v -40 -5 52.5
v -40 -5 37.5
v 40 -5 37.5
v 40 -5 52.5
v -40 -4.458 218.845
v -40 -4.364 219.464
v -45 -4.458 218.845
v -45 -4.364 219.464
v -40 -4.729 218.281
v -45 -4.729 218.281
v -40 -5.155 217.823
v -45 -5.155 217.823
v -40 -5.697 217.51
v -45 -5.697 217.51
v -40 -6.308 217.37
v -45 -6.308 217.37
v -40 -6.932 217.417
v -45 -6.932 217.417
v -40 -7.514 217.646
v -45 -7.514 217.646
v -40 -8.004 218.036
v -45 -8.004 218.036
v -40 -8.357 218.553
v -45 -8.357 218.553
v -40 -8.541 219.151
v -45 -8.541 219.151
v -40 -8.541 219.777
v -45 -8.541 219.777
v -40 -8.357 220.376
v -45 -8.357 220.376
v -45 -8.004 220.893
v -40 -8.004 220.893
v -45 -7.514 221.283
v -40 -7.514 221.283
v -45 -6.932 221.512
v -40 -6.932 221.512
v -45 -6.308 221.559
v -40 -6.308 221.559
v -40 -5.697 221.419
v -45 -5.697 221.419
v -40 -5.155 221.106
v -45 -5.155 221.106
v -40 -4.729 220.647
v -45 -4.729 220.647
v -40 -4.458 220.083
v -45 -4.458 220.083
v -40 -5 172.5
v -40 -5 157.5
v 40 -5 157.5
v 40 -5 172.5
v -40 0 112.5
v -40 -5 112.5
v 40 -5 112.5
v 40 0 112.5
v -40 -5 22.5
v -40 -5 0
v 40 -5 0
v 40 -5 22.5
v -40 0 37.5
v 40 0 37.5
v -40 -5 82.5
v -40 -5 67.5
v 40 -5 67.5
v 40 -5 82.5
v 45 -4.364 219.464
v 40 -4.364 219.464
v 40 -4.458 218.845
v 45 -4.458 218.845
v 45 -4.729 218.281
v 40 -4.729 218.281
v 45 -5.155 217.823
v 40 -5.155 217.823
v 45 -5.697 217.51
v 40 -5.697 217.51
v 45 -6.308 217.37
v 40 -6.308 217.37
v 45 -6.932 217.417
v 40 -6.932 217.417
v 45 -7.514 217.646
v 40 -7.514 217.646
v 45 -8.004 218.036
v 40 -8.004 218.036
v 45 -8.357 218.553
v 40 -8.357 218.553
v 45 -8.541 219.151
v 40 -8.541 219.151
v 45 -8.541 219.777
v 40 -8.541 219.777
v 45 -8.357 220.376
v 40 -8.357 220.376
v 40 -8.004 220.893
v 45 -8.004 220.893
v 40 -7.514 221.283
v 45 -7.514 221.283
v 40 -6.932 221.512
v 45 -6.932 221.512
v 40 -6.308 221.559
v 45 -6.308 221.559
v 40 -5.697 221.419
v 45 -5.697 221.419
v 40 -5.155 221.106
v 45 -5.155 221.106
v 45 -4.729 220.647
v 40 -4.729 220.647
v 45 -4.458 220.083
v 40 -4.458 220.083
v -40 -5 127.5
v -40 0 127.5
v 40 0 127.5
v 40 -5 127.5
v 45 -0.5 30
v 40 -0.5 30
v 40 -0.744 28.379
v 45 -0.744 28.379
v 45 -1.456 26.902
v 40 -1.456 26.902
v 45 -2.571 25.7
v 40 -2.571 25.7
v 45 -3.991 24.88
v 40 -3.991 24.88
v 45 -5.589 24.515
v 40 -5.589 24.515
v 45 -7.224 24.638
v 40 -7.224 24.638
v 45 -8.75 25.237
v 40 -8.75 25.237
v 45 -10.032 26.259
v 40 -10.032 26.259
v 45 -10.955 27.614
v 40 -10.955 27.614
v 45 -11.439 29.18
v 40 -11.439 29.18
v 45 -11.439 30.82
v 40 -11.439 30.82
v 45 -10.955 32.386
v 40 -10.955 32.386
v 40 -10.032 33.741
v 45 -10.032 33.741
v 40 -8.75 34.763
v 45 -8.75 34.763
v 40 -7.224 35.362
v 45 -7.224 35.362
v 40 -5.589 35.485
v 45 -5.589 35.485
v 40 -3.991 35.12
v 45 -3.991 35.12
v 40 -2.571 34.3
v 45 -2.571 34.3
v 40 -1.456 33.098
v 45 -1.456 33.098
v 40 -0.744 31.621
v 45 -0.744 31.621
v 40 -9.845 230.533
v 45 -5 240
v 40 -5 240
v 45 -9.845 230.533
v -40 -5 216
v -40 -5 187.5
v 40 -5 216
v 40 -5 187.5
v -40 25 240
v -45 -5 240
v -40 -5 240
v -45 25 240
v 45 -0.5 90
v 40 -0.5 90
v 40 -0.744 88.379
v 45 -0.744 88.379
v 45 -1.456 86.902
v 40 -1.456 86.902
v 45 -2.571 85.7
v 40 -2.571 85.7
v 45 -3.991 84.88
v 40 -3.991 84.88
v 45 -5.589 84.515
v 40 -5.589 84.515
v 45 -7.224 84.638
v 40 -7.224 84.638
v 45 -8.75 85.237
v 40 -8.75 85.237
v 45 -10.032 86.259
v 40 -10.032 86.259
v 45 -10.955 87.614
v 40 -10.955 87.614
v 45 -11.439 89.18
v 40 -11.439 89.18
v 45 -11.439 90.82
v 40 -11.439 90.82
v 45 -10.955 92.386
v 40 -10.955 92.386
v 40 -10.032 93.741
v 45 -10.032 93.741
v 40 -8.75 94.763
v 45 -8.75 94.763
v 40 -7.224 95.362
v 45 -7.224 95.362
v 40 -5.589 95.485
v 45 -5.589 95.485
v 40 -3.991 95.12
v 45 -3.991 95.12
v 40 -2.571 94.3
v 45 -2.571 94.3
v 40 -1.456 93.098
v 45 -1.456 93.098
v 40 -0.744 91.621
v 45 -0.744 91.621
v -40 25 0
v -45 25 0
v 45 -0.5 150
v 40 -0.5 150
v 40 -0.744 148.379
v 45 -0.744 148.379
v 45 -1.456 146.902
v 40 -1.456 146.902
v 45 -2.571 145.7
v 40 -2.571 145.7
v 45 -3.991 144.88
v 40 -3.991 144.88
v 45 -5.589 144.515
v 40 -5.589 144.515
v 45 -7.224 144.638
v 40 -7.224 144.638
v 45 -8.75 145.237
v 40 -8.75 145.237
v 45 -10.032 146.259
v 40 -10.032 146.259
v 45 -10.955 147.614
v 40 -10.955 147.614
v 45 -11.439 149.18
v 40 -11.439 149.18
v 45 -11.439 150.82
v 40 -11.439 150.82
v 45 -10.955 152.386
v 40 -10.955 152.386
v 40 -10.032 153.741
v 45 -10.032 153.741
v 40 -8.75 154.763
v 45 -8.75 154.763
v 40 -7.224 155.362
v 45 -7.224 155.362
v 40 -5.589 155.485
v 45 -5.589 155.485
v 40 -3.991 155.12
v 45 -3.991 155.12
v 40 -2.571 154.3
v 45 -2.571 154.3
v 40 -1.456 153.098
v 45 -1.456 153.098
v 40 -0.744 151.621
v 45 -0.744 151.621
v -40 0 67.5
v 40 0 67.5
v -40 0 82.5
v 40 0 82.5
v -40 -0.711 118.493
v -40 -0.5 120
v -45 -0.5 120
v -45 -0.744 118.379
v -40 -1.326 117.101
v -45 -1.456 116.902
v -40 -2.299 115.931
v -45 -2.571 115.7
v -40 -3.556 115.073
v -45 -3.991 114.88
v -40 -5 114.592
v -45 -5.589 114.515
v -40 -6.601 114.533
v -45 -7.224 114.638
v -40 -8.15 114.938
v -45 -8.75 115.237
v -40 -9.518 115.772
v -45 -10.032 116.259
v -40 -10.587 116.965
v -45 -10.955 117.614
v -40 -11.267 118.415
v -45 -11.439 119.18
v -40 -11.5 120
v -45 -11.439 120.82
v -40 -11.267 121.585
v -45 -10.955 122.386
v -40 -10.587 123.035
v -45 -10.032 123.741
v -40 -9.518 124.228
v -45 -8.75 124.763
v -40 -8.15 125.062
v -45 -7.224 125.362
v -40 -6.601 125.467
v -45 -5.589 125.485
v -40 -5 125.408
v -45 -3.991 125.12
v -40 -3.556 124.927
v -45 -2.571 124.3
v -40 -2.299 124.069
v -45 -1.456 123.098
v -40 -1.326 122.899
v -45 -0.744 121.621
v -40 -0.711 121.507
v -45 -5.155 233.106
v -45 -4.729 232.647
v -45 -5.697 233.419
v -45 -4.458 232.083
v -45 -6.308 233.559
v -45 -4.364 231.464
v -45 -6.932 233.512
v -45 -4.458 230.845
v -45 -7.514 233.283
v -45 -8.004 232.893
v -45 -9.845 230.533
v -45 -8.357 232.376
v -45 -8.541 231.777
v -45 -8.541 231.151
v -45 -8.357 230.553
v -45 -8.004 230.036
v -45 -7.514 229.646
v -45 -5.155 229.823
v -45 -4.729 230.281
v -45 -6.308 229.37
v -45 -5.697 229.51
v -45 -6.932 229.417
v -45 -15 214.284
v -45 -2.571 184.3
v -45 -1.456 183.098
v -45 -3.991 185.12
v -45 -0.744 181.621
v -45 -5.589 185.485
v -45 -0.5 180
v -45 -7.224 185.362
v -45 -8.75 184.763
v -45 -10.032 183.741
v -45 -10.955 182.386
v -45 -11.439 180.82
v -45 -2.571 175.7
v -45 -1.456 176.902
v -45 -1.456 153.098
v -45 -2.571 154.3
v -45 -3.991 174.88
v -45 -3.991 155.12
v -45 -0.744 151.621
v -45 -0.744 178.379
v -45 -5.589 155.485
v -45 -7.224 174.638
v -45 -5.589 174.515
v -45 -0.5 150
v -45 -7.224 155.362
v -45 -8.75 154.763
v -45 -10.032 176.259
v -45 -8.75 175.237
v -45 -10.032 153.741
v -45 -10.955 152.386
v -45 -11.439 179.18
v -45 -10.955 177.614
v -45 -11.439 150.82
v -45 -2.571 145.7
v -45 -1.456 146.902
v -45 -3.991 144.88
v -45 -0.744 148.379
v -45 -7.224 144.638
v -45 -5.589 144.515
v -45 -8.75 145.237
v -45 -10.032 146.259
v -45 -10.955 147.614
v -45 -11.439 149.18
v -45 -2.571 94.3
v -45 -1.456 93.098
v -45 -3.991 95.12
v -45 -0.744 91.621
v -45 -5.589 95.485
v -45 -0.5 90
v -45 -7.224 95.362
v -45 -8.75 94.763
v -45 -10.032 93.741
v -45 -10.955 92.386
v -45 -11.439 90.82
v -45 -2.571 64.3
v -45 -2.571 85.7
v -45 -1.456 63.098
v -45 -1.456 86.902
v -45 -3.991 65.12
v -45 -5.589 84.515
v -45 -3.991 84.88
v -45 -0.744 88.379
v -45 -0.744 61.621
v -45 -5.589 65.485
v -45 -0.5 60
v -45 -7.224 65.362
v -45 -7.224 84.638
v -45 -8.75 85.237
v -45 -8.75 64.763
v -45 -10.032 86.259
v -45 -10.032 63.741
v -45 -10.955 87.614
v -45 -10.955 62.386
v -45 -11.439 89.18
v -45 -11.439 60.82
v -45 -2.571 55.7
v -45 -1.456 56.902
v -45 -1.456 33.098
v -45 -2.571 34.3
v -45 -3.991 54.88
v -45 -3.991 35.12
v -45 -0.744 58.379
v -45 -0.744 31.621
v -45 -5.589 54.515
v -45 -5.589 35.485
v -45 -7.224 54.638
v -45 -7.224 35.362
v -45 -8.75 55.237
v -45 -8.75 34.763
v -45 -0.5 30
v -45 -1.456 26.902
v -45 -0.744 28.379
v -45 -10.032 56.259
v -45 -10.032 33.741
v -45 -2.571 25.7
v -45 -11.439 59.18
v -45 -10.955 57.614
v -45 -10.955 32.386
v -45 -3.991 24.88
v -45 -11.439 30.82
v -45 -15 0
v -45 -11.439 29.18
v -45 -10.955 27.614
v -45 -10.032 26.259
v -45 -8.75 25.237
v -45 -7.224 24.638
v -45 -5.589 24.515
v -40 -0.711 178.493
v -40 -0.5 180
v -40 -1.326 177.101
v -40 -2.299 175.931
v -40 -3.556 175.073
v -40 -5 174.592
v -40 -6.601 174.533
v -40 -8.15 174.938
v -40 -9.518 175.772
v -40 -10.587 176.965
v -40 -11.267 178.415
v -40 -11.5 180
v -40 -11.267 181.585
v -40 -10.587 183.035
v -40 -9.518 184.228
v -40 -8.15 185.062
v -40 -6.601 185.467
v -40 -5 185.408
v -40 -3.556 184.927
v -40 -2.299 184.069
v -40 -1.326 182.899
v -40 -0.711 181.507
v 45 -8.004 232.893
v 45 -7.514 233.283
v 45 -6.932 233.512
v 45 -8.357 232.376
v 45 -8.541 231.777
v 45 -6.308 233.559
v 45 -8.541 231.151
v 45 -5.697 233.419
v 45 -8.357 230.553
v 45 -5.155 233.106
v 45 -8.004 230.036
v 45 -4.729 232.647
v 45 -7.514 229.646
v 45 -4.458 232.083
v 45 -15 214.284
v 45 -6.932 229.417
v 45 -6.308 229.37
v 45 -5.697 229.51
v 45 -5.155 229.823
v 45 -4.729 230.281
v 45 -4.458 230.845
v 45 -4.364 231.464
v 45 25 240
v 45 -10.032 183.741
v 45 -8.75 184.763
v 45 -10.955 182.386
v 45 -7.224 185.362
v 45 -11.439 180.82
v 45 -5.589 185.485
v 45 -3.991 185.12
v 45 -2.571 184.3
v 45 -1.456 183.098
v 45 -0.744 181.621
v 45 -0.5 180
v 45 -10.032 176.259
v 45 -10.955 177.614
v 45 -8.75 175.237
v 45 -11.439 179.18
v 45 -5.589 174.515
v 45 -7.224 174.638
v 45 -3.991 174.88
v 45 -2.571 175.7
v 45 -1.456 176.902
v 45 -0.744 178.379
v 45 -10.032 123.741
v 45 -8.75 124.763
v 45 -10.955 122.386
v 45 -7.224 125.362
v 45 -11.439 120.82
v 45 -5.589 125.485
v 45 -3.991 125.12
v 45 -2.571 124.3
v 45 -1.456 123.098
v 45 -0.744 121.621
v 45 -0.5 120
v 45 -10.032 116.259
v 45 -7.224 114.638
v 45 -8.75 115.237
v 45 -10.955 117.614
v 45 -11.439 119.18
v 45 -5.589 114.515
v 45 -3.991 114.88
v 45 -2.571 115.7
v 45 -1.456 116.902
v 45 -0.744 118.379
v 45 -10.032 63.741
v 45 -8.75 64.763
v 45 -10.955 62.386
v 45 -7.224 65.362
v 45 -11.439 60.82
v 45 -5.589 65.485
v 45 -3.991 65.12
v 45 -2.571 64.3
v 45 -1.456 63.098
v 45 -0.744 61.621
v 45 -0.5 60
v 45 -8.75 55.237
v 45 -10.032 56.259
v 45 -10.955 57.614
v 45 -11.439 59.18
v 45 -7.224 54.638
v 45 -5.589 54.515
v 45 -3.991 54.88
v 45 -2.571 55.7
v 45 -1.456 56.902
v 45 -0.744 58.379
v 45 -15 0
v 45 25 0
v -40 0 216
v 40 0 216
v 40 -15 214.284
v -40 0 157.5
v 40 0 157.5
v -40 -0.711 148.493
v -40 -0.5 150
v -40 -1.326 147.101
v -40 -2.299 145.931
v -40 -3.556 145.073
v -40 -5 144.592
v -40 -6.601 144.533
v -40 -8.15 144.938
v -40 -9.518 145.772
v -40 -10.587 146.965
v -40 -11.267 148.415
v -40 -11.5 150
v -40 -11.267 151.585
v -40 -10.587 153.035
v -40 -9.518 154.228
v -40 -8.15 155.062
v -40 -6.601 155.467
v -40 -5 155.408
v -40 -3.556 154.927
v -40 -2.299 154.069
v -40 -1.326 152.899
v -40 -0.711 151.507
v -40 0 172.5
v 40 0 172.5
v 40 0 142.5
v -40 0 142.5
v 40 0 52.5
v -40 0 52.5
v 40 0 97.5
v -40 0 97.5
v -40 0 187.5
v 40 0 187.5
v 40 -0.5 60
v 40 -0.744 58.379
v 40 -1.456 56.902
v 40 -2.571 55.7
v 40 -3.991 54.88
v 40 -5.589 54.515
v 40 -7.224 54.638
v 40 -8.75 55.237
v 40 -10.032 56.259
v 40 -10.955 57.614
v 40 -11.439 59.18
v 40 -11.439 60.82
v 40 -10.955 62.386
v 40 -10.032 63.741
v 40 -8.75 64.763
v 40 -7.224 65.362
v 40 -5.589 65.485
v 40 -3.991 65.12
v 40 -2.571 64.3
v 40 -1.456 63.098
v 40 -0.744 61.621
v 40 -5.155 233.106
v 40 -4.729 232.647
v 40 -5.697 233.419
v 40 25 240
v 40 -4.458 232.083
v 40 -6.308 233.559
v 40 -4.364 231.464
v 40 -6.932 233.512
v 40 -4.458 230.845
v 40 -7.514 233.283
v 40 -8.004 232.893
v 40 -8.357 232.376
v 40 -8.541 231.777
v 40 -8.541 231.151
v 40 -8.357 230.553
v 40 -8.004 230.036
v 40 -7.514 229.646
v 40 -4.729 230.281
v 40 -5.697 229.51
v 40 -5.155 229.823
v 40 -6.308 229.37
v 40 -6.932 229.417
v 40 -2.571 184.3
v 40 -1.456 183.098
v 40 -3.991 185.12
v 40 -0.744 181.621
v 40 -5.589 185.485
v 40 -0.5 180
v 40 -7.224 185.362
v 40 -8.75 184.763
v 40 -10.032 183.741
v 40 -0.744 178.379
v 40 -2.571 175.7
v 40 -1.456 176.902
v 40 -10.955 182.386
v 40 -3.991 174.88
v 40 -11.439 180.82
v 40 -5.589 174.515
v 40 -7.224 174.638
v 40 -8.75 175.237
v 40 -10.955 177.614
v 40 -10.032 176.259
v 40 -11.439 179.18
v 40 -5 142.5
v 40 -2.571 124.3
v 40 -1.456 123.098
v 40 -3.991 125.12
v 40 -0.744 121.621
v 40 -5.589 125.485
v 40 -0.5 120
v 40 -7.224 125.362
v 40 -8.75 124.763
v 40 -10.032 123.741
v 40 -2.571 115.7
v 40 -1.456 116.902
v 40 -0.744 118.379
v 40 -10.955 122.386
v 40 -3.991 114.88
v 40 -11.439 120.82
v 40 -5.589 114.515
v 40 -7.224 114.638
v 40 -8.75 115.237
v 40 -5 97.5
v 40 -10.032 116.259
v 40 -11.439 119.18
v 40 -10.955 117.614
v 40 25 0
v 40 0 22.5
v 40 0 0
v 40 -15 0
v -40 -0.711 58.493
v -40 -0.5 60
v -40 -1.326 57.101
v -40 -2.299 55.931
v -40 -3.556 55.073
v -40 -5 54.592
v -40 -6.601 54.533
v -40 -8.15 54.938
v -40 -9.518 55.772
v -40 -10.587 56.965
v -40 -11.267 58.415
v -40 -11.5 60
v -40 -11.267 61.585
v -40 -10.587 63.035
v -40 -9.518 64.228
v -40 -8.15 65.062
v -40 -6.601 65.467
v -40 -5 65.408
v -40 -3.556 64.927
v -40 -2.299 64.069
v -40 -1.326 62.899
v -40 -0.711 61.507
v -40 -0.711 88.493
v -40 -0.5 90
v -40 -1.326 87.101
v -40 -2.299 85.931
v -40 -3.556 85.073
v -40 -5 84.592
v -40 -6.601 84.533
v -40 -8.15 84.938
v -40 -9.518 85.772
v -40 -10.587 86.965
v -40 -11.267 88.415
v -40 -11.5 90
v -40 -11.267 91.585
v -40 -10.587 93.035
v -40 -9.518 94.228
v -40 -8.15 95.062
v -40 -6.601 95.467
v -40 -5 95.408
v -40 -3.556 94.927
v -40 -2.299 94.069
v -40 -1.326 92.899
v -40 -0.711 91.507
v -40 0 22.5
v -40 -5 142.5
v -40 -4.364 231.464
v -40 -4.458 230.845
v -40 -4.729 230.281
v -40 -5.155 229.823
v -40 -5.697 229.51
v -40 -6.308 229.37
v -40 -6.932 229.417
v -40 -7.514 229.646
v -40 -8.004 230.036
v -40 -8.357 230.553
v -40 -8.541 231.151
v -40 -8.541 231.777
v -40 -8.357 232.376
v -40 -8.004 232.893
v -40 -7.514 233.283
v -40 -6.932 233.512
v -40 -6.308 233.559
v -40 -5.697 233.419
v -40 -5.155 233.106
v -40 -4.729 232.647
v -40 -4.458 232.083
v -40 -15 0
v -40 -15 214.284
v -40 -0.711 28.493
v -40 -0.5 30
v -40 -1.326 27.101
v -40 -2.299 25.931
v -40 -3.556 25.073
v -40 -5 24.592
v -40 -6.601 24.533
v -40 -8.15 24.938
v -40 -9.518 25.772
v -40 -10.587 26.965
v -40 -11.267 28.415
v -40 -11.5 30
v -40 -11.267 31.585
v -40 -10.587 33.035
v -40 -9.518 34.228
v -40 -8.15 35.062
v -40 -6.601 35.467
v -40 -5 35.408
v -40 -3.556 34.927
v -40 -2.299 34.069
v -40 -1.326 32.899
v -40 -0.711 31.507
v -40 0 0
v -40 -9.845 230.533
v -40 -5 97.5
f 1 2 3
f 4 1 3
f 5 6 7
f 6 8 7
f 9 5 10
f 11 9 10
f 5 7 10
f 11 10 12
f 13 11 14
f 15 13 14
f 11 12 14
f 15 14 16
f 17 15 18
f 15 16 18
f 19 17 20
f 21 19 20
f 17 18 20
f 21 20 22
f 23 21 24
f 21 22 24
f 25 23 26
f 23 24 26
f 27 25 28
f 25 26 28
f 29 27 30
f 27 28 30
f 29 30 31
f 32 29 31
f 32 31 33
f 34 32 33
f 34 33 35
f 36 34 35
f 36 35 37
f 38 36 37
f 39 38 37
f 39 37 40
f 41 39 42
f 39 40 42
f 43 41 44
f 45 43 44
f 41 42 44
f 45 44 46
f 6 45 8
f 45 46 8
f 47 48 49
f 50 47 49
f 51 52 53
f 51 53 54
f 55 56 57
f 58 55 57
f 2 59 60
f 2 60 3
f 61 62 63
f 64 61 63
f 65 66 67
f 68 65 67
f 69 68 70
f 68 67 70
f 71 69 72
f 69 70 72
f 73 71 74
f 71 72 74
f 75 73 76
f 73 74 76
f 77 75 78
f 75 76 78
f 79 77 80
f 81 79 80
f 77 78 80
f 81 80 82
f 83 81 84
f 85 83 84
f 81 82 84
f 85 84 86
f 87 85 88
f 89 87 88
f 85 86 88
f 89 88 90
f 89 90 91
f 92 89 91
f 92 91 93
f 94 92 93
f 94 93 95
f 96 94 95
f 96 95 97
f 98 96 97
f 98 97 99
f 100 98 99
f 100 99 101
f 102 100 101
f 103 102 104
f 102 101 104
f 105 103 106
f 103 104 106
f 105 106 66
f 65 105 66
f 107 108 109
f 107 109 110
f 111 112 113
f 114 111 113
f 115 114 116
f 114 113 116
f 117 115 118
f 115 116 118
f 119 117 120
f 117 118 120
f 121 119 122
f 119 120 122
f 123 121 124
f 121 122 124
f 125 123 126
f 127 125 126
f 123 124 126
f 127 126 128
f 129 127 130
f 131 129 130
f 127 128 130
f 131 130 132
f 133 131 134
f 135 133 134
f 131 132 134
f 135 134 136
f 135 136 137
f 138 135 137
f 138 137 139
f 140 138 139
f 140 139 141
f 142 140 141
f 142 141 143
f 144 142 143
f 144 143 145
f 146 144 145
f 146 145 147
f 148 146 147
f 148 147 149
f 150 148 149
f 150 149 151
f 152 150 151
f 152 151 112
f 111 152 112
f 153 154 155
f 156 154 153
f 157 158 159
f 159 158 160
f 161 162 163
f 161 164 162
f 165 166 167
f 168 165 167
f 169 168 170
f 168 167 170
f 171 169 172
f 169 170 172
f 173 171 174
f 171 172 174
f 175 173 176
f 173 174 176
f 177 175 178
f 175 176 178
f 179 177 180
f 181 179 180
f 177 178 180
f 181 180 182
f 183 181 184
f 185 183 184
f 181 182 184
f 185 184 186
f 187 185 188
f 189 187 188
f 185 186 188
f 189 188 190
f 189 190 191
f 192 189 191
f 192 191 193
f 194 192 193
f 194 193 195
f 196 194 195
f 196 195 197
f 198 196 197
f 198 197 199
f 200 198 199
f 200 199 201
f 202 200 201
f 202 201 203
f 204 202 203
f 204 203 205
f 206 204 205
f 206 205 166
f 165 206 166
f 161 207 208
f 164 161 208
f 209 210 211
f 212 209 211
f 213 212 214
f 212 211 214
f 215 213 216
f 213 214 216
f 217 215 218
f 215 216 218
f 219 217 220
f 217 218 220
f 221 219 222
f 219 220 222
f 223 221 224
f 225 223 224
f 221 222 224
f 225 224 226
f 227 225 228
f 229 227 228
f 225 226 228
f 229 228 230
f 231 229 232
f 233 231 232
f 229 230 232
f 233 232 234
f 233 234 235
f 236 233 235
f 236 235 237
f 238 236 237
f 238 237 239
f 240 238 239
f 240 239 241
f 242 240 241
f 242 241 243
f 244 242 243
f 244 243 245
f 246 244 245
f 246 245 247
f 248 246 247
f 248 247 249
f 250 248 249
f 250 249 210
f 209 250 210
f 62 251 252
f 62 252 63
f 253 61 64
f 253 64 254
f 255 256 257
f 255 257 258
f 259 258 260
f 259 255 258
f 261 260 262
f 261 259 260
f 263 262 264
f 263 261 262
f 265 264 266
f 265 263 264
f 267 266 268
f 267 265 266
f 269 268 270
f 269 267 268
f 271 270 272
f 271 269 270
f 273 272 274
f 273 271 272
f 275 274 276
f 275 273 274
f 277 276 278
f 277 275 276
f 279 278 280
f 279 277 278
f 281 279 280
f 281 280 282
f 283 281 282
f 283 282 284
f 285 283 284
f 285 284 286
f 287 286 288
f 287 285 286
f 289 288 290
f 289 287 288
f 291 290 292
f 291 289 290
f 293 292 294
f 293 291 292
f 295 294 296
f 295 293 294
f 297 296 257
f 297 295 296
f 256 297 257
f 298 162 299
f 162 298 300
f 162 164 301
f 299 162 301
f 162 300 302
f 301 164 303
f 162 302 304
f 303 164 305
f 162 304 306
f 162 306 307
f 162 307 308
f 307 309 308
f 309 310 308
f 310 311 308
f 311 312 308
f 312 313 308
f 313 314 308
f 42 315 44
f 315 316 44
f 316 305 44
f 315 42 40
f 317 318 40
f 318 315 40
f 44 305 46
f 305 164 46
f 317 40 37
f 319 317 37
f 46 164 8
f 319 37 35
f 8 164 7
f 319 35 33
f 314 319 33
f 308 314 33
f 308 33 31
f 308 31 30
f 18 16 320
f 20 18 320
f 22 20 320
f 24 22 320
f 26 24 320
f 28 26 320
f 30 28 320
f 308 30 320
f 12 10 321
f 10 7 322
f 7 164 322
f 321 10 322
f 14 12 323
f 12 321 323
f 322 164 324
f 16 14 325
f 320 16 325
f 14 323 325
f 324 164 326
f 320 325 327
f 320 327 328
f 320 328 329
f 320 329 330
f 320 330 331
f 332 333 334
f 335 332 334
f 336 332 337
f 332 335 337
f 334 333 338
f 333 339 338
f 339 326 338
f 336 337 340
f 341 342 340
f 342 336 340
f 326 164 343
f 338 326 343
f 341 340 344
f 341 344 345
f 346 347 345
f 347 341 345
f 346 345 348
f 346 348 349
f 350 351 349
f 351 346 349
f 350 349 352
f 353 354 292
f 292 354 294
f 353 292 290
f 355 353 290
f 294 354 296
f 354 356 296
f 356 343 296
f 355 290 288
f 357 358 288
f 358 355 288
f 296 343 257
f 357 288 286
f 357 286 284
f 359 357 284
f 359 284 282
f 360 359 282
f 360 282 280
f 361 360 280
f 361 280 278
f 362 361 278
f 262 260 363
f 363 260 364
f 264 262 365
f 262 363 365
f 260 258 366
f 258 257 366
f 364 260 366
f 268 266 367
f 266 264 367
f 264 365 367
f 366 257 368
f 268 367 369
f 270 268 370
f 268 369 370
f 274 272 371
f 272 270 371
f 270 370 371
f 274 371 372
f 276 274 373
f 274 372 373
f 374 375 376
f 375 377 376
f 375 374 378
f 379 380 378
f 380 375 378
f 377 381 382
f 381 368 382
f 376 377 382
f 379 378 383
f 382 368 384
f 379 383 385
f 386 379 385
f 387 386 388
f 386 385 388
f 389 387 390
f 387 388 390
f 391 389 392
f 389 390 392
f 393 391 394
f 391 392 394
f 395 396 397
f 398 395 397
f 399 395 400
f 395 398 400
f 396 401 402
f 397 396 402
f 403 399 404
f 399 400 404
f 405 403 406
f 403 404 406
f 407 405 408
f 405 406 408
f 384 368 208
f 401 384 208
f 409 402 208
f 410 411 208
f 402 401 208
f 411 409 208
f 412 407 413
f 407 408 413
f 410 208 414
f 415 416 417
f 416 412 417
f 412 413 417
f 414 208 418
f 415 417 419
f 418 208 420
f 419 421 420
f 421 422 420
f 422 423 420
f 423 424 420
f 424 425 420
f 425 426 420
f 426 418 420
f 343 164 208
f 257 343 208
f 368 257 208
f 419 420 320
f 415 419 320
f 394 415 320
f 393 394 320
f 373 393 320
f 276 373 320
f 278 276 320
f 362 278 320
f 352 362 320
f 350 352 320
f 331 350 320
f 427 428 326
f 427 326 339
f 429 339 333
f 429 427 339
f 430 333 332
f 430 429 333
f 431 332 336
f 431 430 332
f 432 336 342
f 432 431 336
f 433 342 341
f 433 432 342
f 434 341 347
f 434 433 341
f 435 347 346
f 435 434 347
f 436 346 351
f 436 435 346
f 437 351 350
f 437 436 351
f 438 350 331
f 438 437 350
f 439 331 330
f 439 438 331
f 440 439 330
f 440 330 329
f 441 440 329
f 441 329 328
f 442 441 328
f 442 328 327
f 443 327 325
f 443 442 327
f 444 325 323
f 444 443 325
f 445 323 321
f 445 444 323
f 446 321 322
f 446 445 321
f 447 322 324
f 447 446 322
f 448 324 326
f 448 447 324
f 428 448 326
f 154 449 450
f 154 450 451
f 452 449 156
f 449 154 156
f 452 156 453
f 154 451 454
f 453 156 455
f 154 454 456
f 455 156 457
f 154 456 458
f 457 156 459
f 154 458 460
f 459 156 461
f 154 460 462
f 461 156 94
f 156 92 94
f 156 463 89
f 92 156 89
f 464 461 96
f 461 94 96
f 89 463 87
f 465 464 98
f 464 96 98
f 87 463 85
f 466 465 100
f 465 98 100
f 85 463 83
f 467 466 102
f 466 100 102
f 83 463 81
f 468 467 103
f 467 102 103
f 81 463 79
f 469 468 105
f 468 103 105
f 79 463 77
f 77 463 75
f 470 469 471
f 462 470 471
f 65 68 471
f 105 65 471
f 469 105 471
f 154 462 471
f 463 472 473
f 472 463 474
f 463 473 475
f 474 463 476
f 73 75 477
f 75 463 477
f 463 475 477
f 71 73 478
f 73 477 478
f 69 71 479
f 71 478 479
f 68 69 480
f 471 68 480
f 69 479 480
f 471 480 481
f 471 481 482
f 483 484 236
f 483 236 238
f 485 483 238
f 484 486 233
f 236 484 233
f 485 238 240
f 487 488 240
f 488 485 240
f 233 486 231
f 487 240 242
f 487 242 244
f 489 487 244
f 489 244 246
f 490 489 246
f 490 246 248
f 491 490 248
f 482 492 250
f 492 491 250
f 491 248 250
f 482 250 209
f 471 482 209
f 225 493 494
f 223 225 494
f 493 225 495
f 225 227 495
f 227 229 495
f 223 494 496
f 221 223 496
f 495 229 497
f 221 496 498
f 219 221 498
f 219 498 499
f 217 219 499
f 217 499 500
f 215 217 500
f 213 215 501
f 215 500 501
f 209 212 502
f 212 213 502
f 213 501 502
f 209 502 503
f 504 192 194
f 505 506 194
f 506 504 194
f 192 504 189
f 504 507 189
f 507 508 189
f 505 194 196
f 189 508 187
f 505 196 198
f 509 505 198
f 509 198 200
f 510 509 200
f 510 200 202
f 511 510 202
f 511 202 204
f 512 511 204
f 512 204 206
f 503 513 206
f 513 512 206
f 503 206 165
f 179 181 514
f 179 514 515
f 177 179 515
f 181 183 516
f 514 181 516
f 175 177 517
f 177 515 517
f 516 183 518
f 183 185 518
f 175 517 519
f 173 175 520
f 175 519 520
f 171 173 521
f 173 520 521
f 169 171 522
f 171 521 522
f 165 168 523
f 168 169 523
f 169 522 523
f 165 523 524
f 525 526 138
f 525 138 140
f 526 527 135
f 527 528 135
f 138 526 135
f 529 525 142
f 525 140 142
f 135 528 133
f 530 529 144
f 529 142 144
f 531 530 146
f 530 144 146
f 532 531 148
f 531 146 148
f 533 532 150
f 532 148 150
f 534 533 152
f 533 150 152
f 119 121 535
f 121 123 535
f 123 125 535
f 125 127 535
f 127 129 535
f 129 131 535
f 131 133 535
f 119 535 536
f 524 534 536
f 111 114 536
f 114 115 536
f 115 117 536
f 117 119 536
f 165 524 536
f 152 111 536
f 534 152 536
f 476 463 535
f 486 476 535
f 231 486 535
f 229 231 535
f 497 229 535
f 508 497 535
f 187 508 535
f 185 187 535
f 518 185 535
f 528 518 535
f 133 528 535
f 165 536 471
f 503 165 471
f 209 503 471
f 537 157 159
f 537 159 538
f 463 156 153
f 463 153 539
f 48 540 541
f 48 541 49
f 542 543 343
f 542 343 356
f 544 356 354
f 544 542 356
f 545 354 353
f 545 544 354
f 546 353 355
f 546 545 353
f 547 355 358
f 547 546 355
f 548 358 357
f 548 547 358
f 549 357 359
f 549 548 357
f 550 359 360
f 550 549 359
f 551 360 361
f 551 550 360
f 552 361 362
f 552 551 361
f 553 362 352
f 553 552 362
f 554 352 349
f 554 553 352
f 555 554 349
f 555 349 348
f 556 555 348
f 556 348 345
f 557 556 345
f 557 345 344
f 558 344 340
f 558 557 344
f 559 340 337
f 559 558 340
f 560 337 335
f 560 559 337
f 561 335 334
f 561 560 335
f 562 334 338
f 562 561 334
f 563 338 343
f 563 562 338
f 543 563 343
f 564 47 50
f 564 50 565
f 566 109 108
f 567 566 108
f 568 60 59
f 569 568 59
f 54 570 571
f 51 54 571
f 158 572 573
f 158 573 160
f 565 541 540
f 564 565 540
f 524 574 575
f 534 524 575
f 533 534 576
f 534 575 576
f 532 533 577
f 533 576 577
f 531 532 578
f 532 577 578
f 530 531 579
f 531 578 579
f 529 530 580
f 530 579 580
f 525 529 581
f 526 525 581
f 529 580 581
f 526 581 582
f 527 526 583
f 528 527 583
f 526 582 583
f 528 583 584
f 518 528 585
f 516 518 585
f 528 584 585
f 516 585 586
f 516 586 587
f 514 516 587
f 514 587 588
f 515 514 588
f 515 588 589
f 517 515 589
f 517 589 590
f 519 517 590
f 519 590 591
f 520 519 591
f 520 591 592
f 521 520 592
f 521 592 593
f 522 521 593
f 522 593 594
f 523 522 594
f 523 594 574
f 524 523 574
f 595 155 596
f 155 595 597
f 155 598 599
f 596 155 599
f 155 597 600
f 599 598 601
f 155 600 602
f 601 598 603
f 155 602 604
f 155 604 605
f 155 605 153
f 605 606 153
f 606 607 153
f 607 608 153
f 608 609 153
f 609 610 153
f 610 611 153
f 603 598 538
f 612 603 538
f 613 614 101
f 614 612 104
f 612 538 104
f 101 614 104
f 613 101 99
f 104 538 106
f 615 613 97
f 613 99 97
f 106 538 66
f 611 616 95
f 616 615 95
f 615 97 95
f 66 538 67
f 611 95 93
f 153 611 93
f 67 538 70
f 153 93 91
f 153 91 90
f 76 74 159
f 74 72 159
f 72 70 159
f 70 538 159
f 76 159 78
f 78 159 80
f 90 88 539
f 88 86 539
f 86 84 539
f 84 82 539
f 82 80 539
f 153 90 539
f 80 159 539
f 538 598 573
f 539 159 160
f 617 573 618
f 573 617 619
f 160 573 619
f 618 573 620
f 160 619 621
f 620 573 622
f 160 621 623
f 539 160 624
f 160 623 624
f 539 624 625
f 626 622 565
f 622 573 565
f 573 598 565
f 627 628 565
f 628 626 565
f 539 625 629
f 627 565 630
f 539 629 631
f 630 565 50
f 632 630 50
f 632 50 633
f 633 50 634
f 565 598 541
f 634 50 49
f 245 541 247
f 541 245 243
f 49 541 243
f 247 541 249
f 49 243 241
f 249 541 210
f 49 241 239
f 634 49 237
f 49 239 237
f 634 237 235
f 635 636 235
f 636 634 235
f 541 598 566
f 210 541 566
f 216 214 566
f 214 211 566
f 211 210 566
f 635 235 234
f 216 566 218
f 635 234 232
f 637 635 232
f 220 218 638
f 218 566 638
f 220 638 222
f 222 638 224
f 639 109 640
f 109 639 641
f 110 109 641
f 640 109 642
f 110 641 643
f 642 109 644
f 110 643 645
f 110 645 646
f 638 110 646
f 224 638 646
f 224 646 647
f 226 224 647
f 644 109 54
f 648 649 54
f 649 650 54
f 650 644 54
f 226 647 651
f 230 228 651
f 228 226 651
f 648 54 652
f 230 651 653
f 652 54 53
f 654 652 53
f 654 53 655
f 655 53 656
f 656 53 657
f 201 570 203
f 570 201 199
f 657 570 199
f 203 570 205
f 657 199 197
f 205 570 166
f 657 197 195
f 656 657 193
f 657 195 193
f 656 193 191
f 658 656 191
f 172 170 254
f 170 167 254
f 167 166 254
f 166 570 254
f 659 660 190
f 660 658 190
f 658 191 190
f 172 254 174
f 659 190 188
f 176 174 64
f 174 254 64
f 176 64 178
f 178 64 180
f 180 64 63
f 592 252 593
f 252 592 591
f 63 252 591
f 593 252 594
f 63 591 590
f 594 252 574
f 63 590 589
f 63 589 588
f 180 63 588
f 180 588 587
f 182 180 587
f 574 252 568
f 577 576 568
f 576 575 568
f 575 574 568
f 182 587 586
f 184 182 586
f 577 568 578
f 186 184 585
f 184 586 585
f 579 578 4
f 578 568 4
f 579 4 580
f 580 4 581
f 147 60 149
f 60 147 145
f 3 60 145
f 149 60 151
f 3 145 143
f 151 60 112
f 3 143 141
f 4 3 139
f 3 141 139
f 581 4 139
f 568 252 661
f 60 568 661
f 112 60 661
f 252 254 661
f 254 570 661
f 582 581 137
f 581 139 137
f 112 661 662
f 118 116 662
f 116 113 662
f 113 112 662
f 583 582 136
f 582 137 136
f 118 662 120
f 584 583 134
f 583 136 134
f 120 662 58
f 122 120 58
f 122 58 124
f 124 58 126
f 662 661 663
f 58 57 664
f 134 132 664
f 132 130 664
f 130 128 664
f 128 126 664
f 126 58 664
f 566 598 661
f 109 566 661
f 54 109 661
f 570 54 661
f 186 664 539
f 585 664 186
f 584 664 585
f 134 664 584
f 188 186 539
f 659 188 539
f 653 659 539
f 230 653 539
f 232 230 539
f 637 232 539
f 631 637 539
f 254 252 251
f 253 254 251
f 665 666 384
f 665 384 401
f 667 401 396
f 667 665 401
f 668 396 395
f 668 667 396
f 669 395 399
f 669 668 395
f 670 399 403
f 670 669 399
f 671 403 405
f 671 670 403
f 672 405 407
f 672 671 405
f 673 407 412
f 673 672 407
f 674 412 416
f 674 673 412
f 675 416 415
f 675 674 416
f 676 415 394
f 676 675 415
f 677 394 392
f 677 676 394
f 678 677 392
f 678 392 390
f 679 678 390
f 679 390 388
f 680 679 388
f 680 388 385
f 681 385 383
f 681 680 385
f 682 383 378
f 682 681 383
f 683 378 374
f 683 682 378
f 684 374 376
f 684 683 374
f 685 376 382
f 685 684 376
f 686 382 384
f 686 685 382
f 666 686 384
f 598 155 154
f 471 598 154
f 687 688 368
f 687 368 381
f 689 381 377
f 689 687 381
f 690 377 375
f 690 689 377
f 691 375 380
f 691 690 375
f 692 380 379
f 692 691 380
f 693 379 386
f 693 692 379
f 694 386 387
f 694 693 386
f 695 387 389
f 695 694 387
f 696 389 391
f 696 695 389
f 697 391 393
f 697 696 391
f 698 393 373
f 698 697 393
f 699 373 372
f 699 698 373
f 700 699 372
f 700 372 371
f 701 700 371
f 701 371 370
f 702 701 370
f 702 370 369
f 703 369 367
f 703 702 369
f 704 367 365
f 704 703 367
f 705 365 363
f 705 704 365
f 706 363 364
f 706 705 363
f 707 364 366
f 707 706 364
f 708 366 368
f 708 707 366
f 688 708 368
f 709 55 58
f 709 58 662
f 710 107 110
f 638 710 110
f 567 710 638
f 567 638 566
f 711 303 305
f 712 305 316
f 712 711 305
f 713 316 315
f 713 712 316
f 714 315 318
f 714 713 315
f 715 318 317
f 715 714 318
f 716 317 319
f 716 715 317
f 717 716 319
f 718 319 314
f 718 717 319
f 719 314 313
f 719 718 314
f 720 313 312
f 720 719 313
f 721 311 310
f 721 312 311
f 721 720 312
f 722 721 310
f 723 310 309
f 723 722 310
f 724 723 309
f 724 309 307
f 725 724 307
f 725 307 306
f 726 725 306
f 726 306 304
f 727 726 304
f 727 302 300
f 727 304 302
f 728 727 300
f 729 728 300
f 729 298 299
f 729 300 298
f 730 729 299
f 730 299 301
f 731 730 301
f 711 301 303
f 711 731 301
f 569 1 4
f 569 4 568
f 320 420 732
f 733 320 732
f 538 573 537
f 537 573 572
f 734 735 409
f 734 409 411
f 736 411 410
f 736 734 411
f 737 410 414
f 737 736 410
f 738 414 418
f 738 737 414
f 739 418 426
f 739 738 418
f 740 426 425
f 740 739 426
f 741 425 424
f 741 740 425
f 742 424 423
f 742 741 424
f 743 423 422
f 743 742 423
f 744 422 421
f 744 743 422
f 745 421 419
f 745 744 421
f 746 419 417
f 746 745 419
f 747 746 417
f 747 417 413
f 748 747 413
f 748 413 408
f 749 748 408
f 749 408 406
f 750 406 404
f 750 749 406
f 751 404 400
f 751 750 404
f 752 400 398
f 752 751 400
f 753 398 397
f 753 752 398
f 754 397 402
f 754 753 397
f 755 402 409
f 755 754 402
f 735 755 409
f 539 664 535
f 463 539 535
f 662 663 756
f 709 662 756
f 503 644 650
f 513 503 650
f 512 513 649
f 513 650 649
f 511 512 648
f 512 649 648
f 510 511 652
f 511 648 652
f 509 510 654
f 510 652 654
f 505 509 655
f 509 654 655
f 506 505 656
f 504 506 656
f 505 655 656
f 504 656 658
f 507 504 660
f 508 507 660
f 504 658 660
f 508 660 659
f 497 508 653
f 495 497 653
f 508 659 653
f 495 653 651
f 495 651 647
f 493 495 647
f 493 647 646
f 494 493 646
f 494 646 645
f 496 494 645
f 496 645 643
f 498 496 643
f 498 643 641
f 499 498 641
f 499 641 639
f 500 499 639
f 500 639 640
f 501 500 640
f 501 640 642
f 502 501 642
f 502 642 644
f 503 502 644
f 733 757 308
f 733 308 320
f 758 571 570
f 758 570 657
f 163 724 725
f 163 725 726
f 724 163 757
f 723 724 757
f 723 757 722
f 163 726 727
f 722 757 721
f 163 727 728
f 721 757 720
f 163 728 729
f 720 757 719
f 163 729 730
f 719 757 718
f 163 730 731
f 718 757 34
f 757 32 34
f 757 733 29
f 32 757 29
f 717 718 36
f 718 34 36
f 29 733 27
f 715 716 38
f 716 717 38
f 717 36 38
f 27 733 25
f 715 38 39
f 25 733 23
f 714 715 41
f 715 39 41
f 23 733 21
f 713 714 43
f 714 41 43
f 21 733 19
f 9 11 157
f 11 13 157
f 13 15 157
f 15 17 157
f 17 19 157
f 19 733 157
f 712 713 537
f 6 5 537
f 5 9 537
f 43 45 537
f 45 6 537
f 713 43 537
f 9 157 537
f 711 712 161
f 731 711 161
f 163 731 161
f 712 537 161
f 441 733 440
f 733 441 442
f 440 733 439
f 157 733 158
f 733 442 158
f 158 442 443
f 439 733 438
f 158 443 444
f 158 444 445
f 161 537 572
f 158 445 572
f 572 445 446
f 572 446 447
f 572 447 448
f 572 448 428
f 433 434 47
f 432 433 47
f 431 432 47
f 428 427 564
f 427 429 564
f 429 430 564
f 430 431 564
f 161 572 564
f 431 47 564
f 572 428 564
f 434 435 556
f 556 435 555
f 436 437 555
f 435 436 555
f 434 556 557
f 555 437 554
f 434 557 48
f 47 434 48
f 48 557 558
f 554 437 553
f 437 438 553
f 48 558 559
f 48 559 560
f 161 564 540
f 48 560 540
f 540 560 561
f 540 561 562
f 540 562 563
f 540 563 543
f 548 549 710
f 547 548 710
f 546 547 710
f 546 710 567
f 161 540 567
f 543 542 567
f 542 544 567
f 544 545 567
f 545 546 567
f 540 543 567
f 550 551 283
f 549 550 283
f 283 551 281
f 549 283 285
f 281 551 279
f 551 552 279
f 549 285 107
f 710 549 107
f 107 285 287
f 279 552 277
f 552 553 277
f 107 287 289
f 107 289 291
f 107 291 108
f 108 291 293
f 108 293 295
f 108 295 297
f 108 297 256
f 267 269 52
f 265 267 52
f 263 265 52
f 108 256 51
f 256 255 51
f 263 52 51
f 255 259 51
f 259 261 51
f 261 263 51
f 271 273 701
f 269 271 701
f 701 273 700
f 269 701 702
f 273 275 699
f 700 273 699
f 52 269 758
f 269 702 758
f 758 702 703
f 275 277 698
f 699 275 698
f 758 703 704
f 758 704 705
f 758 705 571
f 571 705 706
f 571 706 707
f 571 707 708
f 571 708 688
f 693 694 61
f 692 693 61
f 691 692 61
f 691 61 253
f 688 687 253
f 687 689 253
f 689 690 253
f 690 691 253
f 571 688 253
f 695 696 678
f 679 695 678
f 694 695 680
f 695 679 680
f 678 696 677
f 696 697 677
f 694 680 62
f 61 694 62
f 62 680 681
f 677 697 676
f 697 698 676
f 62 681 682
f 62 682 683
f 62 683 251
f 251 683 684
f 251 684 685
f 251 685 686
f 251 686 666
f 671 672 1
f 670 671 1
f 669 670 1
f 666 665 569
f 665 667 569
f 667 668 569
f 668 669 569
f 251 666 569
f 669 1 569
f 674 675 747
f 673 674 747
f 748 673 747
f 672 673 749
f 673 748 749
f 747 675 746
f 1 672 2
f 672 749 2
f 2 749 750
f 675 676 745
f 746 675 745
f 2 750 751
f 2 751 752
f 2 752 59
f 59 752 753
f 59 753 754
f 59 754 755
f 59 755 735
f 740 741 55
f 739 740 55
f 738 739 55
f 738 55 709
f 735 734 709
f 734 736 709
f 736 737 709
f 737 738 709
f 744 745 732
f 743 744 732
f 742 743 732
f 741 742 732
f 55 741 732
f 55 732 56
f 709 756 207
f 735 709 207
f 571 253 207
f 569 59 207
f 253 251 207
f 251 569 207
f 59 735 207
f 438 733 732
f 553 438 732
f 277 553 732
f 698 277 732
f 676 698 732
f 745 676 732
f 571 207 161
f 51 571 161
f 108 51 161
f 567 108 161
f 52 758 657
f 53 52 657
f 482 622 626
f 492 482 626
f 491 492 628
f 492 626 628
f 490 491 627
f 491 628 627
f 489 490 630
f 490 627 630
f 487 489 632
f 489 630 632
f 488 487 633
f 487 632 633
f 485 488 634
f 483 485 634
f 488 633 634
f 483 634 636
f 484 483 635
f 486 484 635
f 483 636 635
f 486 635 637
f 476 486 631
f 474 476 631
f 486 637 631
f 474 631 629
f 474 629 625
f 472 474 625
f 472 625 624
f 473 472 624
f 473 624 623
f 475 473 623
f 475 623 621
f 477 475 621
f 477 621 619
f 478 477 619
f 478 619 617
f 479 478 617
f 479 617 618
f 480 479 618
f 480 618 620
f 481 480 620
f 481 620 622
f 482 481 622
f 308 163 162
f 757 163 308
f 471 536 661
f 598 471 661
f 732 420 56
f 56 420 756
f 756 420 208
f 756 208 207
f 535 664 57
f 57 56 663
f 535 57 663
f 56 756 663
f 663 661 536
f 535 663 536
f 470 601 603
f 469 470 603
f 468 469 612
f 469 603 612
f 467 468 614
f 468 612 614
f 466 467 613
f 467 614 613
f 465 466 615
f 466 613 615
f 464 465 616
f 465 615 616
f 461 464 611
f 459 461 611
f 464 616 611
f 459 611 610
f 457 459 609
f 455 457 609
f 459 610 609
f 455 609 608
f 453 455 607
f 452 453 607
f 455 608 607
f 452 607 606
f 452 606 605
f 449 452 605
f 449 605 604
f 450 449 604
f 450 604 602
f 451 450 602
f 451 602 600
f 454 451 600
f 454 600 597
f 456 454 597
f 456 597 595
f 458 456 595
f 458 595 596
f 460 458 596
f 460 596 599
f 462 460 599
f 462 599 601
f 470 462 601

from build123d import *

# Parameters (mm, degrees)
SKETCH_1_W          = 5
SKETCH_1_H          = 10
EXTRUDE_1_DEPTH     = 240
SKETCH_3_R          = 2.1
SKETCH_3_R_2        = 5.5
CUT_EXTRUDE_1_DEPTH = 90
CUT_EXTRUDE_2_DEPTH = 80
SKETCH_8_W          = 24
SKETCH_8_H          = 5
CUT_EXTRUDE_3_DEPTH = 80


# Read off the part's stored shape, not the designer's step: 切除-拉伸2
with BuildPart() as part:
    # 草图1 → 凸台-拉伸1 (new body)
    with BuildSketch(Plane.XY):
        Polygon((0, -5), (0, 0), (-40, 0), (-40, 25), (-45, 25), (-45, -5), (-40, -5), align=None)
        Polygon((40, 25), (40, 0), (0, 0), (0, -5), (40, -5), (45, -5), (45, 25), align=None)
        with Locations((-42.5, -10)):
            Rectangle(SKETCH_1_W, SKETCH_1_H)
        with Locations((42.5, -10)):
            Rectangle(SKETCH_1_W, SKETCH_1_H)
    extrude(amount=EXTRUDE_1_DEPTH)

    # 草图3 → 切除-拉伸1 (cut, symmetric)
    with BuildSketch(Plane.ZY.offset(-40)):
        Polygon((240, -15), (240, -5), (230.53341221, -9.845037717), (214.283999291, -15), align=None)
        with Locations(Location((231.464466094, -6.464466094, 0), (0, 0, 90))):
            Circle(SKETCH_3_R)
        with Locations(Location((30, -6, 0), (0, 0, 90))):
            Circle(SKETCH_3_R_2)
        with Locations(Location((60, -6, 0), (0, 0, 90))):
            Circle(SKETCH_3_R_2)
        with Locations(Location((90, -6, 0), (0, 0, 90))):
            Circle(SKETCH_3_R_2)
        with Locations(Location((120, -6, 0), (0, 0, 90))):
            Circle(SKETCH_3_R_2)
        with Locations(Location((150, -6, 0), (0, 0, 90))):
            Circle(SKETCH_3_R_2)
        with Locations(Location((180, -6, 0), (0, 0, 90))):
            Circle(SKETCH_3_R_2)
        with Locations(Location((219.464466094, -6.464466094, 0), (0, 0, 90))):
            Circle(SKETCH_3_R)
    extrude(amount=CUT_EXTRUDE_1_DEPTH, both=True, mode=Mode.SUBTRACT)

    # 切除-拉伸2 outline → 切除-拉伸2 (cut)
    with BuildSketch(Plane(origin=(-40, 0, 0), x_dir=(0, 0, -1), z_dir=(1, 0, 0))):
        with BuildLine():
            Line((-82.5, -5), (-82.5, 0))
            Line((-82.5, 0), (-97.5, 0))
            Line((-97.5, 0), (-97.5, -5))
            Line((-97.5, -5), (-95.408326913, -5))
            ThreePointArc((-95.408326913, -5), (-90, -0.5), (-84.591673087, -5))
            Line((-84.591673087, -5), (-82.5, -5))
        make_face()
        with BuildLine():
            Line((-52.5, 0), (-67.5, 0))
            Line((-67.5, 0), (-67.5, -5))
            Line((-67.5, -5), (-65.408326913, -5))
            ThreePointArc((-65.408326913, -5), (-60, -0.5), (-54.591673087, -5))
            Line((-54.591673087, -5), (-52.5, -5))
            Line((-52.5, -5), (-52.5, 0))
        make_face()
        with BuildLine():
            Line((-112.5, -5), (-112.5, 0))
            Line((-112.5, 0), (-127.5, 0))
            Line((-127.5, 0), (-127.5, -5))
            Line((-127.5, -5), (-125.408326913, -5))
            ThreePointArc((-125.408326913, -5), (-120, -0.5), (-114.591673087, -5))
            Line((-114.591673087, -5), (-112.5, -5))
        make_face()
        with BuildLine():
            Line((-22.5, 0), (-37.5, 0))
            Line((-37.5, 0), (-37.5, -5))
            Line((-37.5, -5), (-35.408326913, -5))
            ThreePointArc((-35.408326913, -5), (-30, -0.5), (-24.591673087, -5))
            Line((-24.591673087, -5), (-22.5, -5))
            Line((-22.5, -5), (-22.5, 0))
        make_face()
        with BuildLine():
            Line((-142.5, -5), (-142.5, 0))
            Line((-142.5, 0), (-157.5, 0))
            Line((-157.5, 0), (-157.5, -5))
            Line((-157.5, -5), (-155.408326913, -5))
            ThreePointArc((-155.408326913, -5), (-150, -0.5), (-144.591673087, -5))
            Line((-144.591673087, -5), (-142.5, -5))
        make_face()
        with BuildLine():
            Line((-172.5, -5), (-172.5, 0))
            Line((-172.5, 0), (-187.5, 0))
            Line((-187.5, 0), (-187.5, -5))
            Line((-187.5, -5), (-185.408326913, -5))
            ThreePointArc((-185.408326913, -5), (-180, -0.5), (-174.591673087, -5))
            Line((-174.591673087, -5), (-172.5, -5))
        make_face()
    extrude(amount=CUT_EXTRUDE_2_DEPTH, mode=Mode.SUBTRACT)

    # 草图8 → 切除-拉伸3 (cut)
    with BuildSketch(Plane(origin=(-40, 0, 0), x_dir=(0, 0, -1), z_dir=(1, 0, 0))):
        with Locations((-228, -2.5)):
            Rectangle(SKETCH_8_W, SKETCH_8_H)
    extrude(amount=CUT_EXTRUDE_3_DEPTH, mode=Mode.SUBTRACT)


solid = part.part
